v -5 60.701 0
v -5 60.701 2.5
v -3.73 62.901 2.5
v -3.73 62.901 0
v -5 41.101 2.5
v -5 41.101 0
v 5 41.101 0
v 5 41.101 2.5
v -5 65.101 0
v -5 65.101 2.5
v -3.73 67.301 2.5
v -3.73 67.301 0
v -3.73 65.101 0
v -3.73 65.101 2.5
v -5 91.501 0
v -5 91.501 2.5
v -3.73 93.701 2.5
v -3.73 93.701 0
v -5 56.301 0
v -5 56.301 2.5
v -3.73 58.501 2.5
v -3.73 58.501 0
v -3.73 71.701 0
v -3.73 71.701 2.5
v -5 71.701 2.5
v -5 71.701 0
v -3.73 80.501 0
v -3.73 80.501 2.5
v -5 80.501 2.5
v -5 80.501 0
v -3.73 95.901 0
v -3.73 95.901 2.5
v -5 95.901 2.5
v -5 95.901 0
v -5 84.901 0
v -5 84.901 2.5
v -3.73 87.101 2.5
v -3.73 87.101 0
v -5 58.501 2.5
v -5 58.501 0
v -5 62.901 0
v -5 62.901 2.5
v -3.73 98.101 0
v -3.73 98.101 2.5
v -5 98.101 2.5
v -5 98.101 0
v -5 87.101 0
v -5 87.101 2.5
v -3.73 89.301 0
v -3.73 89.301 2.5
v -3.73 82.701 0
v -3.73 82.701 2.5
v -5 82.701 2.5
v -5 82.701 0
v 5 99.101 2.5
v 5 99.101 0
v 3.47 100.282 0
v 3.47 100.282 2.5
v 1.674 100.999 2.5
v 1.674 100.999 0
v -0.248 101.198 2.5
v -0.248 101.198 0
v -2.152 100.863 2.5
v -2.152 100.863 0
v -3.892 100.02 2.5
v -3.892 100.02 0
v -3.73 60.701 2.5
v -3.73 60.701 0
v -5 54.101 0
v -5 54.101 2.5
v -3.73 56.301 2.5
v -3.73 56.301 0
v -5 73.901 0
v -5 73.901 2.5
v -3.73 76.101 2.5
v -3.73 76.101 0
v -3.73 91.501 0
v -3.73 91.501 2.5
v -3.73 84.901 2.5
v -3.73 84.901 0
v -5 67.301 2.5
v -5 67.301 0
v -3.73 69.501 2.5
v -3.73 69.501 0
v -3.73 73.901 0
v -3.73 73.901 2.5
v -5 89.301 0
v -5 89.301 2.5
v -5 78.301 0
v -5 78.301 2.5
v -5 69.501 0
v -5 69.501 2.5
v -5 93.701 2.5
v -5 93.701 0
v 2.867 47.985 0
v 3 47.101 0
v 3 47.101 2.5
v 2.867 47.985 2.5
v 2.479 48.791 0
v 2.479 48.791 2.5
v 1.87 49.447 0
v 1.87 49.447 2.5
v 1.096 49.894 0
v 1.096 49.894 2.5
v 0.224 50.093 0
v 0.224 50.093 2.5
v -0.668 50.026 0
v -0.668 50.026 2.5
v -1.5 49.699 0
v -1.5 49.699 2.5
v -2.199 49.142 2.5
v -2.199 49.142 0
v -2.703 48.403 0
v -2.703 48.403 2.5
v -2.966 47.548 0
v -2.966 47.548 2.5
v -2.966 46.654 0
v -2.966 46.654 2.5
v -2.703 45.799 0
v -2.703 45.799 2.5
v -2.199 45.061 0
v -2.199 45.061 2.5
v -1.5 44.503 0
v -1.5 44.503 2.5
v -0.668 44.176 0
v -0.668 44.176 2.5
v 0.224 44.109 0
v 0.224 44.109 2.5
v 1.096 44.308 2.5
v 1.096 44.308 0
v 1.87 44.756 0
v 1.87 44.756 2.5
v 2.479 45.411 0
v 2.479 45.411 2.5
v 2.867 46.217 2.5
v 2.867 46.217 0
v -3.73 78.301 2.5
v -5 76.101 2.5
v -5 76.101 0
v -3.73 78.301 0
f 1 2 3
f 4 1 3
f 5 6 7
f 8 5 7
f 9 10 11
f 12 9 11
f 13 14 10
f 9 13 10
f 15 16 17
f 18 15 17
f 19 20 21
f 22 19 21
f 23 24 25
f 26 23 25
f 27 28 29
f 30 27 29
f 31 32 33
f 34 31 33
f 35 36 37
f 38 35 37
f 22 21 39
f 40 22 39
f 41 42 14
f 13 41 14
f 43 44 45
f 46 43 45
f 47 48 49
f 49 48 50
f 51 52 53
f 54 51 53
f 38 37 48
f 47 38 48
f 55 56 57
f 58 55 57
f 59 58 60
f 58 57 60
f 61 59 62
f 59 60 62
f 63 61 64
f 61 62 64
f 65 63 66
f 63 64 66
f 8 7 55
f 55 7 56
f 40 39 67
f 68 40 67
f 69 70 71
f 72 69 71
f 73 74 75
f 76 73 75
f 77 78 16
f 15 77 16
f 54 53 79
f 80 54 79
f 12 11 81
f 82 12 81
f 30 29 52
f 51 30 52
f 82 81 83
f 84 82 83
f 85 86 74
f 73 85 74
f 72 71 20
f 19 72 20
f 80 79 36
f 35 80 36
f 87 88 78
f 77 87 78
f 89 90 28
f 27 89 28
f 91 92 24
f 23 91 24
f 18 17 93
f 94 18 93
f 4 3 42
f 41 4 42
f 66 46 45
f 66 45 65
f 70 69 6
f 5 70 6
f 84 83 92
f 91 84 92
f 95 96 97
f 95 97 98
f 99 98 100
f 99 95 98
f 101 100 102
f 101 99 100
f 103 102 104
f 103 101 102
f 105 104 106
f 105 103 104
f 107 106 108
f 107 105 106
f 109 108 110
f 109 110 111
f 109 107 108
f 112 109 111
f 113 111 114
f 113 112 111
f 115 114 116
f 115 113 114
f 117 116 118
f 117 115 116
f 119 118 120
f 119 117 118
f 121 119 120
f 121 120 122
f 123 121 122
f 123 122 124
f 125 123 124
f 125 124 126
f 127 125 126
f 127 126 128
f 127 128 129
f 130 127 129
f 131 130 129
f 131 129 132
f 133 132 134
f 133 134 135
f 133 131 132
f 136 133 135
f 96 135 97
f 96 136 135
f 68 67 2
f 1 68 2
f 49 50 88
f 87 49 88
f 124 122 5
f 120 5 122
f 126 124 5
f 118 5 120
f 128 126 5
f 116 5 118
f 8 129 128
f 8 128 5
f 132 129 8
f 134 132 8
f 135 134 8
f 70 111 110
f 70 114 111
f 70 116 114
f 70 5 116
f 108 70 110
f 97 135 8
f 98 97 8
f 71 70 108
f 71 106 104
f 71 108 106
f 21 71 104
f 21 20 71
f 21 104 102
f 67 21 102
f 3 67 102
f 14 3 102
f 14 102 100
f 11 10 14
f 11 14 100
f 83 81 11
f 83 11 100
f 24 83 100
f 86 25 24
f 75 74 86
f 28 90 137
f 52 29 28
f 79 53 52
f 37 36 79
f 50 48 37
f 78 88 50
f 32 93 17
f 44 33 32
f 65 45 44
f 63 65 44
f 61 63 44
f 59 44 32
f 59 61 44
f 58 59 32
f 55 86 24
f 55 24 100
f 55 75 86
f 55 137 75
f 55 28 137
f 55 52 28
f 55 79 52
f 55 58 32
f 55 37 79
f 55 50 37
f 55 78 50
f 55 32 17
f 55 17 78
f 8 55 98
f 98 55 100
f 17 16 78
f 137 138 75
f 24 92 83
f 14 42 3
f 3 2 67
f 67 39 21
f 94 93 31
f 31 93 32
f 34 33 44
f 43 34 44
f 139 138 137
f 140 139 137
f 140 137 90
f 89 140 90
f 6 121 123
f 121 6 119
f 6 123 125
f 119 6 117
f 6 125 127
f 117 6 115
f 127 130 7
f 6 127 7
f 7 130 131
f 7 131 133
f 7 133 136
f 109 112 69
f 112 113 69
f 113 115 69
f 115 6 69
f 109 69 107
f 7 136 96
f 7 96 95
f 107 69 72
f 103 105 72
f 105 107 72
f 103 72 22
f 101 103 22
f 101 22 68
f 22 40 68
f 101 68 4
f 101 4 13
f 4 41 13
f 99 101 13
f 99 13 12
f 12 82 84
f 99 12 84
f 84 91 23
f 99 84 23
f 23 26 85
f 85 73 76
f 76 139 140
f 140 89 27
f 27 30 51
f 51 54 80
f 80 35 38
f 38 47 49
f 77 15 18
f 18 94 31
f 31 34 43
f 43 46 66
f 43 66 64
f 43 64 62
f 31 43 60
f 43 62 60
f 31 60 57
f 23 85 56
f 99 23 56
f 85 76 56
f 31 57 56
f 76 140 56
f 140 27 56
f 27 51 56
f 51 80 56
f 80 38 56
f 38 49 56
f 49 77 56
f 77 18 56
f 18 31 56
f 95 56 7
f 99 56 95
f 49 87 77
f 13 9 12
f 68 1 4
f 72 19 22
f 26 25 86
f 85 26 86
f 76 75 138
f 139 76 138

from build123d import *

# Parameters (mm, degrees)
ESQUISSE1_R                = 3
BASE_EXTRUSION_DEPTH       = 2.5
ENL_V_MAT_EXTRU_1_DEPTH    = 102.356317555
R_P_TITION_LIN_AIRE1_COUNT = 22
R_P_TITION_LIN_AIRE1_PITCH = 2.2


with BuildPart() as part:
    # Esquisse1 → Base-Extrusion (new body)
    with BuildSketch(Plane.XY):
        with BuildLine():
            Line((-5, 99.101020514), (-5, 41.101020514))
            Line((-5, 41.101020514), (5, 41.101020514))
            Line((5, 41.101020514), (5, 99.101020514))
            ThreePointArc((5, 99.101020514), (0, 101.202041029), (-5, 99.101020514))
        make_face()
        with Locations((0, 47.101020514)):
            Circle(ESQUISSE1_R, mode=Mode.SUBTRACT)
    extrude(amount=BASE_EXTRUSION_DEPTH)

    # Esquisse2 → Enlèv. mat.-Extru.1 (cut, through all)
    with BuildSketch(Plane.XY.offset(2.5)):
        Polygon((-5, 56.301020514), (-5, 54.101020514), (-3.729829408, 56.301020514), align=None)
    enl_v_mat_extru_1 = extrude(amount=-ENL_V_MAT_EXTRU_1_DEPTH, mode=Mode.SUBTRACT)

    # Répétition linéaire1: Enlèv. mat.-Extru.1 ×22
    with Locations(*[(0, i * R_P_TITION_LIN_AIRE1_PITCH, 0) for i in range(1, R_P_TITION_LIN_AIRE1_COUNT)]):
        add(enl_v_mat_extru_1, mode=Mode.SUBTRACT)


solid = part.part
